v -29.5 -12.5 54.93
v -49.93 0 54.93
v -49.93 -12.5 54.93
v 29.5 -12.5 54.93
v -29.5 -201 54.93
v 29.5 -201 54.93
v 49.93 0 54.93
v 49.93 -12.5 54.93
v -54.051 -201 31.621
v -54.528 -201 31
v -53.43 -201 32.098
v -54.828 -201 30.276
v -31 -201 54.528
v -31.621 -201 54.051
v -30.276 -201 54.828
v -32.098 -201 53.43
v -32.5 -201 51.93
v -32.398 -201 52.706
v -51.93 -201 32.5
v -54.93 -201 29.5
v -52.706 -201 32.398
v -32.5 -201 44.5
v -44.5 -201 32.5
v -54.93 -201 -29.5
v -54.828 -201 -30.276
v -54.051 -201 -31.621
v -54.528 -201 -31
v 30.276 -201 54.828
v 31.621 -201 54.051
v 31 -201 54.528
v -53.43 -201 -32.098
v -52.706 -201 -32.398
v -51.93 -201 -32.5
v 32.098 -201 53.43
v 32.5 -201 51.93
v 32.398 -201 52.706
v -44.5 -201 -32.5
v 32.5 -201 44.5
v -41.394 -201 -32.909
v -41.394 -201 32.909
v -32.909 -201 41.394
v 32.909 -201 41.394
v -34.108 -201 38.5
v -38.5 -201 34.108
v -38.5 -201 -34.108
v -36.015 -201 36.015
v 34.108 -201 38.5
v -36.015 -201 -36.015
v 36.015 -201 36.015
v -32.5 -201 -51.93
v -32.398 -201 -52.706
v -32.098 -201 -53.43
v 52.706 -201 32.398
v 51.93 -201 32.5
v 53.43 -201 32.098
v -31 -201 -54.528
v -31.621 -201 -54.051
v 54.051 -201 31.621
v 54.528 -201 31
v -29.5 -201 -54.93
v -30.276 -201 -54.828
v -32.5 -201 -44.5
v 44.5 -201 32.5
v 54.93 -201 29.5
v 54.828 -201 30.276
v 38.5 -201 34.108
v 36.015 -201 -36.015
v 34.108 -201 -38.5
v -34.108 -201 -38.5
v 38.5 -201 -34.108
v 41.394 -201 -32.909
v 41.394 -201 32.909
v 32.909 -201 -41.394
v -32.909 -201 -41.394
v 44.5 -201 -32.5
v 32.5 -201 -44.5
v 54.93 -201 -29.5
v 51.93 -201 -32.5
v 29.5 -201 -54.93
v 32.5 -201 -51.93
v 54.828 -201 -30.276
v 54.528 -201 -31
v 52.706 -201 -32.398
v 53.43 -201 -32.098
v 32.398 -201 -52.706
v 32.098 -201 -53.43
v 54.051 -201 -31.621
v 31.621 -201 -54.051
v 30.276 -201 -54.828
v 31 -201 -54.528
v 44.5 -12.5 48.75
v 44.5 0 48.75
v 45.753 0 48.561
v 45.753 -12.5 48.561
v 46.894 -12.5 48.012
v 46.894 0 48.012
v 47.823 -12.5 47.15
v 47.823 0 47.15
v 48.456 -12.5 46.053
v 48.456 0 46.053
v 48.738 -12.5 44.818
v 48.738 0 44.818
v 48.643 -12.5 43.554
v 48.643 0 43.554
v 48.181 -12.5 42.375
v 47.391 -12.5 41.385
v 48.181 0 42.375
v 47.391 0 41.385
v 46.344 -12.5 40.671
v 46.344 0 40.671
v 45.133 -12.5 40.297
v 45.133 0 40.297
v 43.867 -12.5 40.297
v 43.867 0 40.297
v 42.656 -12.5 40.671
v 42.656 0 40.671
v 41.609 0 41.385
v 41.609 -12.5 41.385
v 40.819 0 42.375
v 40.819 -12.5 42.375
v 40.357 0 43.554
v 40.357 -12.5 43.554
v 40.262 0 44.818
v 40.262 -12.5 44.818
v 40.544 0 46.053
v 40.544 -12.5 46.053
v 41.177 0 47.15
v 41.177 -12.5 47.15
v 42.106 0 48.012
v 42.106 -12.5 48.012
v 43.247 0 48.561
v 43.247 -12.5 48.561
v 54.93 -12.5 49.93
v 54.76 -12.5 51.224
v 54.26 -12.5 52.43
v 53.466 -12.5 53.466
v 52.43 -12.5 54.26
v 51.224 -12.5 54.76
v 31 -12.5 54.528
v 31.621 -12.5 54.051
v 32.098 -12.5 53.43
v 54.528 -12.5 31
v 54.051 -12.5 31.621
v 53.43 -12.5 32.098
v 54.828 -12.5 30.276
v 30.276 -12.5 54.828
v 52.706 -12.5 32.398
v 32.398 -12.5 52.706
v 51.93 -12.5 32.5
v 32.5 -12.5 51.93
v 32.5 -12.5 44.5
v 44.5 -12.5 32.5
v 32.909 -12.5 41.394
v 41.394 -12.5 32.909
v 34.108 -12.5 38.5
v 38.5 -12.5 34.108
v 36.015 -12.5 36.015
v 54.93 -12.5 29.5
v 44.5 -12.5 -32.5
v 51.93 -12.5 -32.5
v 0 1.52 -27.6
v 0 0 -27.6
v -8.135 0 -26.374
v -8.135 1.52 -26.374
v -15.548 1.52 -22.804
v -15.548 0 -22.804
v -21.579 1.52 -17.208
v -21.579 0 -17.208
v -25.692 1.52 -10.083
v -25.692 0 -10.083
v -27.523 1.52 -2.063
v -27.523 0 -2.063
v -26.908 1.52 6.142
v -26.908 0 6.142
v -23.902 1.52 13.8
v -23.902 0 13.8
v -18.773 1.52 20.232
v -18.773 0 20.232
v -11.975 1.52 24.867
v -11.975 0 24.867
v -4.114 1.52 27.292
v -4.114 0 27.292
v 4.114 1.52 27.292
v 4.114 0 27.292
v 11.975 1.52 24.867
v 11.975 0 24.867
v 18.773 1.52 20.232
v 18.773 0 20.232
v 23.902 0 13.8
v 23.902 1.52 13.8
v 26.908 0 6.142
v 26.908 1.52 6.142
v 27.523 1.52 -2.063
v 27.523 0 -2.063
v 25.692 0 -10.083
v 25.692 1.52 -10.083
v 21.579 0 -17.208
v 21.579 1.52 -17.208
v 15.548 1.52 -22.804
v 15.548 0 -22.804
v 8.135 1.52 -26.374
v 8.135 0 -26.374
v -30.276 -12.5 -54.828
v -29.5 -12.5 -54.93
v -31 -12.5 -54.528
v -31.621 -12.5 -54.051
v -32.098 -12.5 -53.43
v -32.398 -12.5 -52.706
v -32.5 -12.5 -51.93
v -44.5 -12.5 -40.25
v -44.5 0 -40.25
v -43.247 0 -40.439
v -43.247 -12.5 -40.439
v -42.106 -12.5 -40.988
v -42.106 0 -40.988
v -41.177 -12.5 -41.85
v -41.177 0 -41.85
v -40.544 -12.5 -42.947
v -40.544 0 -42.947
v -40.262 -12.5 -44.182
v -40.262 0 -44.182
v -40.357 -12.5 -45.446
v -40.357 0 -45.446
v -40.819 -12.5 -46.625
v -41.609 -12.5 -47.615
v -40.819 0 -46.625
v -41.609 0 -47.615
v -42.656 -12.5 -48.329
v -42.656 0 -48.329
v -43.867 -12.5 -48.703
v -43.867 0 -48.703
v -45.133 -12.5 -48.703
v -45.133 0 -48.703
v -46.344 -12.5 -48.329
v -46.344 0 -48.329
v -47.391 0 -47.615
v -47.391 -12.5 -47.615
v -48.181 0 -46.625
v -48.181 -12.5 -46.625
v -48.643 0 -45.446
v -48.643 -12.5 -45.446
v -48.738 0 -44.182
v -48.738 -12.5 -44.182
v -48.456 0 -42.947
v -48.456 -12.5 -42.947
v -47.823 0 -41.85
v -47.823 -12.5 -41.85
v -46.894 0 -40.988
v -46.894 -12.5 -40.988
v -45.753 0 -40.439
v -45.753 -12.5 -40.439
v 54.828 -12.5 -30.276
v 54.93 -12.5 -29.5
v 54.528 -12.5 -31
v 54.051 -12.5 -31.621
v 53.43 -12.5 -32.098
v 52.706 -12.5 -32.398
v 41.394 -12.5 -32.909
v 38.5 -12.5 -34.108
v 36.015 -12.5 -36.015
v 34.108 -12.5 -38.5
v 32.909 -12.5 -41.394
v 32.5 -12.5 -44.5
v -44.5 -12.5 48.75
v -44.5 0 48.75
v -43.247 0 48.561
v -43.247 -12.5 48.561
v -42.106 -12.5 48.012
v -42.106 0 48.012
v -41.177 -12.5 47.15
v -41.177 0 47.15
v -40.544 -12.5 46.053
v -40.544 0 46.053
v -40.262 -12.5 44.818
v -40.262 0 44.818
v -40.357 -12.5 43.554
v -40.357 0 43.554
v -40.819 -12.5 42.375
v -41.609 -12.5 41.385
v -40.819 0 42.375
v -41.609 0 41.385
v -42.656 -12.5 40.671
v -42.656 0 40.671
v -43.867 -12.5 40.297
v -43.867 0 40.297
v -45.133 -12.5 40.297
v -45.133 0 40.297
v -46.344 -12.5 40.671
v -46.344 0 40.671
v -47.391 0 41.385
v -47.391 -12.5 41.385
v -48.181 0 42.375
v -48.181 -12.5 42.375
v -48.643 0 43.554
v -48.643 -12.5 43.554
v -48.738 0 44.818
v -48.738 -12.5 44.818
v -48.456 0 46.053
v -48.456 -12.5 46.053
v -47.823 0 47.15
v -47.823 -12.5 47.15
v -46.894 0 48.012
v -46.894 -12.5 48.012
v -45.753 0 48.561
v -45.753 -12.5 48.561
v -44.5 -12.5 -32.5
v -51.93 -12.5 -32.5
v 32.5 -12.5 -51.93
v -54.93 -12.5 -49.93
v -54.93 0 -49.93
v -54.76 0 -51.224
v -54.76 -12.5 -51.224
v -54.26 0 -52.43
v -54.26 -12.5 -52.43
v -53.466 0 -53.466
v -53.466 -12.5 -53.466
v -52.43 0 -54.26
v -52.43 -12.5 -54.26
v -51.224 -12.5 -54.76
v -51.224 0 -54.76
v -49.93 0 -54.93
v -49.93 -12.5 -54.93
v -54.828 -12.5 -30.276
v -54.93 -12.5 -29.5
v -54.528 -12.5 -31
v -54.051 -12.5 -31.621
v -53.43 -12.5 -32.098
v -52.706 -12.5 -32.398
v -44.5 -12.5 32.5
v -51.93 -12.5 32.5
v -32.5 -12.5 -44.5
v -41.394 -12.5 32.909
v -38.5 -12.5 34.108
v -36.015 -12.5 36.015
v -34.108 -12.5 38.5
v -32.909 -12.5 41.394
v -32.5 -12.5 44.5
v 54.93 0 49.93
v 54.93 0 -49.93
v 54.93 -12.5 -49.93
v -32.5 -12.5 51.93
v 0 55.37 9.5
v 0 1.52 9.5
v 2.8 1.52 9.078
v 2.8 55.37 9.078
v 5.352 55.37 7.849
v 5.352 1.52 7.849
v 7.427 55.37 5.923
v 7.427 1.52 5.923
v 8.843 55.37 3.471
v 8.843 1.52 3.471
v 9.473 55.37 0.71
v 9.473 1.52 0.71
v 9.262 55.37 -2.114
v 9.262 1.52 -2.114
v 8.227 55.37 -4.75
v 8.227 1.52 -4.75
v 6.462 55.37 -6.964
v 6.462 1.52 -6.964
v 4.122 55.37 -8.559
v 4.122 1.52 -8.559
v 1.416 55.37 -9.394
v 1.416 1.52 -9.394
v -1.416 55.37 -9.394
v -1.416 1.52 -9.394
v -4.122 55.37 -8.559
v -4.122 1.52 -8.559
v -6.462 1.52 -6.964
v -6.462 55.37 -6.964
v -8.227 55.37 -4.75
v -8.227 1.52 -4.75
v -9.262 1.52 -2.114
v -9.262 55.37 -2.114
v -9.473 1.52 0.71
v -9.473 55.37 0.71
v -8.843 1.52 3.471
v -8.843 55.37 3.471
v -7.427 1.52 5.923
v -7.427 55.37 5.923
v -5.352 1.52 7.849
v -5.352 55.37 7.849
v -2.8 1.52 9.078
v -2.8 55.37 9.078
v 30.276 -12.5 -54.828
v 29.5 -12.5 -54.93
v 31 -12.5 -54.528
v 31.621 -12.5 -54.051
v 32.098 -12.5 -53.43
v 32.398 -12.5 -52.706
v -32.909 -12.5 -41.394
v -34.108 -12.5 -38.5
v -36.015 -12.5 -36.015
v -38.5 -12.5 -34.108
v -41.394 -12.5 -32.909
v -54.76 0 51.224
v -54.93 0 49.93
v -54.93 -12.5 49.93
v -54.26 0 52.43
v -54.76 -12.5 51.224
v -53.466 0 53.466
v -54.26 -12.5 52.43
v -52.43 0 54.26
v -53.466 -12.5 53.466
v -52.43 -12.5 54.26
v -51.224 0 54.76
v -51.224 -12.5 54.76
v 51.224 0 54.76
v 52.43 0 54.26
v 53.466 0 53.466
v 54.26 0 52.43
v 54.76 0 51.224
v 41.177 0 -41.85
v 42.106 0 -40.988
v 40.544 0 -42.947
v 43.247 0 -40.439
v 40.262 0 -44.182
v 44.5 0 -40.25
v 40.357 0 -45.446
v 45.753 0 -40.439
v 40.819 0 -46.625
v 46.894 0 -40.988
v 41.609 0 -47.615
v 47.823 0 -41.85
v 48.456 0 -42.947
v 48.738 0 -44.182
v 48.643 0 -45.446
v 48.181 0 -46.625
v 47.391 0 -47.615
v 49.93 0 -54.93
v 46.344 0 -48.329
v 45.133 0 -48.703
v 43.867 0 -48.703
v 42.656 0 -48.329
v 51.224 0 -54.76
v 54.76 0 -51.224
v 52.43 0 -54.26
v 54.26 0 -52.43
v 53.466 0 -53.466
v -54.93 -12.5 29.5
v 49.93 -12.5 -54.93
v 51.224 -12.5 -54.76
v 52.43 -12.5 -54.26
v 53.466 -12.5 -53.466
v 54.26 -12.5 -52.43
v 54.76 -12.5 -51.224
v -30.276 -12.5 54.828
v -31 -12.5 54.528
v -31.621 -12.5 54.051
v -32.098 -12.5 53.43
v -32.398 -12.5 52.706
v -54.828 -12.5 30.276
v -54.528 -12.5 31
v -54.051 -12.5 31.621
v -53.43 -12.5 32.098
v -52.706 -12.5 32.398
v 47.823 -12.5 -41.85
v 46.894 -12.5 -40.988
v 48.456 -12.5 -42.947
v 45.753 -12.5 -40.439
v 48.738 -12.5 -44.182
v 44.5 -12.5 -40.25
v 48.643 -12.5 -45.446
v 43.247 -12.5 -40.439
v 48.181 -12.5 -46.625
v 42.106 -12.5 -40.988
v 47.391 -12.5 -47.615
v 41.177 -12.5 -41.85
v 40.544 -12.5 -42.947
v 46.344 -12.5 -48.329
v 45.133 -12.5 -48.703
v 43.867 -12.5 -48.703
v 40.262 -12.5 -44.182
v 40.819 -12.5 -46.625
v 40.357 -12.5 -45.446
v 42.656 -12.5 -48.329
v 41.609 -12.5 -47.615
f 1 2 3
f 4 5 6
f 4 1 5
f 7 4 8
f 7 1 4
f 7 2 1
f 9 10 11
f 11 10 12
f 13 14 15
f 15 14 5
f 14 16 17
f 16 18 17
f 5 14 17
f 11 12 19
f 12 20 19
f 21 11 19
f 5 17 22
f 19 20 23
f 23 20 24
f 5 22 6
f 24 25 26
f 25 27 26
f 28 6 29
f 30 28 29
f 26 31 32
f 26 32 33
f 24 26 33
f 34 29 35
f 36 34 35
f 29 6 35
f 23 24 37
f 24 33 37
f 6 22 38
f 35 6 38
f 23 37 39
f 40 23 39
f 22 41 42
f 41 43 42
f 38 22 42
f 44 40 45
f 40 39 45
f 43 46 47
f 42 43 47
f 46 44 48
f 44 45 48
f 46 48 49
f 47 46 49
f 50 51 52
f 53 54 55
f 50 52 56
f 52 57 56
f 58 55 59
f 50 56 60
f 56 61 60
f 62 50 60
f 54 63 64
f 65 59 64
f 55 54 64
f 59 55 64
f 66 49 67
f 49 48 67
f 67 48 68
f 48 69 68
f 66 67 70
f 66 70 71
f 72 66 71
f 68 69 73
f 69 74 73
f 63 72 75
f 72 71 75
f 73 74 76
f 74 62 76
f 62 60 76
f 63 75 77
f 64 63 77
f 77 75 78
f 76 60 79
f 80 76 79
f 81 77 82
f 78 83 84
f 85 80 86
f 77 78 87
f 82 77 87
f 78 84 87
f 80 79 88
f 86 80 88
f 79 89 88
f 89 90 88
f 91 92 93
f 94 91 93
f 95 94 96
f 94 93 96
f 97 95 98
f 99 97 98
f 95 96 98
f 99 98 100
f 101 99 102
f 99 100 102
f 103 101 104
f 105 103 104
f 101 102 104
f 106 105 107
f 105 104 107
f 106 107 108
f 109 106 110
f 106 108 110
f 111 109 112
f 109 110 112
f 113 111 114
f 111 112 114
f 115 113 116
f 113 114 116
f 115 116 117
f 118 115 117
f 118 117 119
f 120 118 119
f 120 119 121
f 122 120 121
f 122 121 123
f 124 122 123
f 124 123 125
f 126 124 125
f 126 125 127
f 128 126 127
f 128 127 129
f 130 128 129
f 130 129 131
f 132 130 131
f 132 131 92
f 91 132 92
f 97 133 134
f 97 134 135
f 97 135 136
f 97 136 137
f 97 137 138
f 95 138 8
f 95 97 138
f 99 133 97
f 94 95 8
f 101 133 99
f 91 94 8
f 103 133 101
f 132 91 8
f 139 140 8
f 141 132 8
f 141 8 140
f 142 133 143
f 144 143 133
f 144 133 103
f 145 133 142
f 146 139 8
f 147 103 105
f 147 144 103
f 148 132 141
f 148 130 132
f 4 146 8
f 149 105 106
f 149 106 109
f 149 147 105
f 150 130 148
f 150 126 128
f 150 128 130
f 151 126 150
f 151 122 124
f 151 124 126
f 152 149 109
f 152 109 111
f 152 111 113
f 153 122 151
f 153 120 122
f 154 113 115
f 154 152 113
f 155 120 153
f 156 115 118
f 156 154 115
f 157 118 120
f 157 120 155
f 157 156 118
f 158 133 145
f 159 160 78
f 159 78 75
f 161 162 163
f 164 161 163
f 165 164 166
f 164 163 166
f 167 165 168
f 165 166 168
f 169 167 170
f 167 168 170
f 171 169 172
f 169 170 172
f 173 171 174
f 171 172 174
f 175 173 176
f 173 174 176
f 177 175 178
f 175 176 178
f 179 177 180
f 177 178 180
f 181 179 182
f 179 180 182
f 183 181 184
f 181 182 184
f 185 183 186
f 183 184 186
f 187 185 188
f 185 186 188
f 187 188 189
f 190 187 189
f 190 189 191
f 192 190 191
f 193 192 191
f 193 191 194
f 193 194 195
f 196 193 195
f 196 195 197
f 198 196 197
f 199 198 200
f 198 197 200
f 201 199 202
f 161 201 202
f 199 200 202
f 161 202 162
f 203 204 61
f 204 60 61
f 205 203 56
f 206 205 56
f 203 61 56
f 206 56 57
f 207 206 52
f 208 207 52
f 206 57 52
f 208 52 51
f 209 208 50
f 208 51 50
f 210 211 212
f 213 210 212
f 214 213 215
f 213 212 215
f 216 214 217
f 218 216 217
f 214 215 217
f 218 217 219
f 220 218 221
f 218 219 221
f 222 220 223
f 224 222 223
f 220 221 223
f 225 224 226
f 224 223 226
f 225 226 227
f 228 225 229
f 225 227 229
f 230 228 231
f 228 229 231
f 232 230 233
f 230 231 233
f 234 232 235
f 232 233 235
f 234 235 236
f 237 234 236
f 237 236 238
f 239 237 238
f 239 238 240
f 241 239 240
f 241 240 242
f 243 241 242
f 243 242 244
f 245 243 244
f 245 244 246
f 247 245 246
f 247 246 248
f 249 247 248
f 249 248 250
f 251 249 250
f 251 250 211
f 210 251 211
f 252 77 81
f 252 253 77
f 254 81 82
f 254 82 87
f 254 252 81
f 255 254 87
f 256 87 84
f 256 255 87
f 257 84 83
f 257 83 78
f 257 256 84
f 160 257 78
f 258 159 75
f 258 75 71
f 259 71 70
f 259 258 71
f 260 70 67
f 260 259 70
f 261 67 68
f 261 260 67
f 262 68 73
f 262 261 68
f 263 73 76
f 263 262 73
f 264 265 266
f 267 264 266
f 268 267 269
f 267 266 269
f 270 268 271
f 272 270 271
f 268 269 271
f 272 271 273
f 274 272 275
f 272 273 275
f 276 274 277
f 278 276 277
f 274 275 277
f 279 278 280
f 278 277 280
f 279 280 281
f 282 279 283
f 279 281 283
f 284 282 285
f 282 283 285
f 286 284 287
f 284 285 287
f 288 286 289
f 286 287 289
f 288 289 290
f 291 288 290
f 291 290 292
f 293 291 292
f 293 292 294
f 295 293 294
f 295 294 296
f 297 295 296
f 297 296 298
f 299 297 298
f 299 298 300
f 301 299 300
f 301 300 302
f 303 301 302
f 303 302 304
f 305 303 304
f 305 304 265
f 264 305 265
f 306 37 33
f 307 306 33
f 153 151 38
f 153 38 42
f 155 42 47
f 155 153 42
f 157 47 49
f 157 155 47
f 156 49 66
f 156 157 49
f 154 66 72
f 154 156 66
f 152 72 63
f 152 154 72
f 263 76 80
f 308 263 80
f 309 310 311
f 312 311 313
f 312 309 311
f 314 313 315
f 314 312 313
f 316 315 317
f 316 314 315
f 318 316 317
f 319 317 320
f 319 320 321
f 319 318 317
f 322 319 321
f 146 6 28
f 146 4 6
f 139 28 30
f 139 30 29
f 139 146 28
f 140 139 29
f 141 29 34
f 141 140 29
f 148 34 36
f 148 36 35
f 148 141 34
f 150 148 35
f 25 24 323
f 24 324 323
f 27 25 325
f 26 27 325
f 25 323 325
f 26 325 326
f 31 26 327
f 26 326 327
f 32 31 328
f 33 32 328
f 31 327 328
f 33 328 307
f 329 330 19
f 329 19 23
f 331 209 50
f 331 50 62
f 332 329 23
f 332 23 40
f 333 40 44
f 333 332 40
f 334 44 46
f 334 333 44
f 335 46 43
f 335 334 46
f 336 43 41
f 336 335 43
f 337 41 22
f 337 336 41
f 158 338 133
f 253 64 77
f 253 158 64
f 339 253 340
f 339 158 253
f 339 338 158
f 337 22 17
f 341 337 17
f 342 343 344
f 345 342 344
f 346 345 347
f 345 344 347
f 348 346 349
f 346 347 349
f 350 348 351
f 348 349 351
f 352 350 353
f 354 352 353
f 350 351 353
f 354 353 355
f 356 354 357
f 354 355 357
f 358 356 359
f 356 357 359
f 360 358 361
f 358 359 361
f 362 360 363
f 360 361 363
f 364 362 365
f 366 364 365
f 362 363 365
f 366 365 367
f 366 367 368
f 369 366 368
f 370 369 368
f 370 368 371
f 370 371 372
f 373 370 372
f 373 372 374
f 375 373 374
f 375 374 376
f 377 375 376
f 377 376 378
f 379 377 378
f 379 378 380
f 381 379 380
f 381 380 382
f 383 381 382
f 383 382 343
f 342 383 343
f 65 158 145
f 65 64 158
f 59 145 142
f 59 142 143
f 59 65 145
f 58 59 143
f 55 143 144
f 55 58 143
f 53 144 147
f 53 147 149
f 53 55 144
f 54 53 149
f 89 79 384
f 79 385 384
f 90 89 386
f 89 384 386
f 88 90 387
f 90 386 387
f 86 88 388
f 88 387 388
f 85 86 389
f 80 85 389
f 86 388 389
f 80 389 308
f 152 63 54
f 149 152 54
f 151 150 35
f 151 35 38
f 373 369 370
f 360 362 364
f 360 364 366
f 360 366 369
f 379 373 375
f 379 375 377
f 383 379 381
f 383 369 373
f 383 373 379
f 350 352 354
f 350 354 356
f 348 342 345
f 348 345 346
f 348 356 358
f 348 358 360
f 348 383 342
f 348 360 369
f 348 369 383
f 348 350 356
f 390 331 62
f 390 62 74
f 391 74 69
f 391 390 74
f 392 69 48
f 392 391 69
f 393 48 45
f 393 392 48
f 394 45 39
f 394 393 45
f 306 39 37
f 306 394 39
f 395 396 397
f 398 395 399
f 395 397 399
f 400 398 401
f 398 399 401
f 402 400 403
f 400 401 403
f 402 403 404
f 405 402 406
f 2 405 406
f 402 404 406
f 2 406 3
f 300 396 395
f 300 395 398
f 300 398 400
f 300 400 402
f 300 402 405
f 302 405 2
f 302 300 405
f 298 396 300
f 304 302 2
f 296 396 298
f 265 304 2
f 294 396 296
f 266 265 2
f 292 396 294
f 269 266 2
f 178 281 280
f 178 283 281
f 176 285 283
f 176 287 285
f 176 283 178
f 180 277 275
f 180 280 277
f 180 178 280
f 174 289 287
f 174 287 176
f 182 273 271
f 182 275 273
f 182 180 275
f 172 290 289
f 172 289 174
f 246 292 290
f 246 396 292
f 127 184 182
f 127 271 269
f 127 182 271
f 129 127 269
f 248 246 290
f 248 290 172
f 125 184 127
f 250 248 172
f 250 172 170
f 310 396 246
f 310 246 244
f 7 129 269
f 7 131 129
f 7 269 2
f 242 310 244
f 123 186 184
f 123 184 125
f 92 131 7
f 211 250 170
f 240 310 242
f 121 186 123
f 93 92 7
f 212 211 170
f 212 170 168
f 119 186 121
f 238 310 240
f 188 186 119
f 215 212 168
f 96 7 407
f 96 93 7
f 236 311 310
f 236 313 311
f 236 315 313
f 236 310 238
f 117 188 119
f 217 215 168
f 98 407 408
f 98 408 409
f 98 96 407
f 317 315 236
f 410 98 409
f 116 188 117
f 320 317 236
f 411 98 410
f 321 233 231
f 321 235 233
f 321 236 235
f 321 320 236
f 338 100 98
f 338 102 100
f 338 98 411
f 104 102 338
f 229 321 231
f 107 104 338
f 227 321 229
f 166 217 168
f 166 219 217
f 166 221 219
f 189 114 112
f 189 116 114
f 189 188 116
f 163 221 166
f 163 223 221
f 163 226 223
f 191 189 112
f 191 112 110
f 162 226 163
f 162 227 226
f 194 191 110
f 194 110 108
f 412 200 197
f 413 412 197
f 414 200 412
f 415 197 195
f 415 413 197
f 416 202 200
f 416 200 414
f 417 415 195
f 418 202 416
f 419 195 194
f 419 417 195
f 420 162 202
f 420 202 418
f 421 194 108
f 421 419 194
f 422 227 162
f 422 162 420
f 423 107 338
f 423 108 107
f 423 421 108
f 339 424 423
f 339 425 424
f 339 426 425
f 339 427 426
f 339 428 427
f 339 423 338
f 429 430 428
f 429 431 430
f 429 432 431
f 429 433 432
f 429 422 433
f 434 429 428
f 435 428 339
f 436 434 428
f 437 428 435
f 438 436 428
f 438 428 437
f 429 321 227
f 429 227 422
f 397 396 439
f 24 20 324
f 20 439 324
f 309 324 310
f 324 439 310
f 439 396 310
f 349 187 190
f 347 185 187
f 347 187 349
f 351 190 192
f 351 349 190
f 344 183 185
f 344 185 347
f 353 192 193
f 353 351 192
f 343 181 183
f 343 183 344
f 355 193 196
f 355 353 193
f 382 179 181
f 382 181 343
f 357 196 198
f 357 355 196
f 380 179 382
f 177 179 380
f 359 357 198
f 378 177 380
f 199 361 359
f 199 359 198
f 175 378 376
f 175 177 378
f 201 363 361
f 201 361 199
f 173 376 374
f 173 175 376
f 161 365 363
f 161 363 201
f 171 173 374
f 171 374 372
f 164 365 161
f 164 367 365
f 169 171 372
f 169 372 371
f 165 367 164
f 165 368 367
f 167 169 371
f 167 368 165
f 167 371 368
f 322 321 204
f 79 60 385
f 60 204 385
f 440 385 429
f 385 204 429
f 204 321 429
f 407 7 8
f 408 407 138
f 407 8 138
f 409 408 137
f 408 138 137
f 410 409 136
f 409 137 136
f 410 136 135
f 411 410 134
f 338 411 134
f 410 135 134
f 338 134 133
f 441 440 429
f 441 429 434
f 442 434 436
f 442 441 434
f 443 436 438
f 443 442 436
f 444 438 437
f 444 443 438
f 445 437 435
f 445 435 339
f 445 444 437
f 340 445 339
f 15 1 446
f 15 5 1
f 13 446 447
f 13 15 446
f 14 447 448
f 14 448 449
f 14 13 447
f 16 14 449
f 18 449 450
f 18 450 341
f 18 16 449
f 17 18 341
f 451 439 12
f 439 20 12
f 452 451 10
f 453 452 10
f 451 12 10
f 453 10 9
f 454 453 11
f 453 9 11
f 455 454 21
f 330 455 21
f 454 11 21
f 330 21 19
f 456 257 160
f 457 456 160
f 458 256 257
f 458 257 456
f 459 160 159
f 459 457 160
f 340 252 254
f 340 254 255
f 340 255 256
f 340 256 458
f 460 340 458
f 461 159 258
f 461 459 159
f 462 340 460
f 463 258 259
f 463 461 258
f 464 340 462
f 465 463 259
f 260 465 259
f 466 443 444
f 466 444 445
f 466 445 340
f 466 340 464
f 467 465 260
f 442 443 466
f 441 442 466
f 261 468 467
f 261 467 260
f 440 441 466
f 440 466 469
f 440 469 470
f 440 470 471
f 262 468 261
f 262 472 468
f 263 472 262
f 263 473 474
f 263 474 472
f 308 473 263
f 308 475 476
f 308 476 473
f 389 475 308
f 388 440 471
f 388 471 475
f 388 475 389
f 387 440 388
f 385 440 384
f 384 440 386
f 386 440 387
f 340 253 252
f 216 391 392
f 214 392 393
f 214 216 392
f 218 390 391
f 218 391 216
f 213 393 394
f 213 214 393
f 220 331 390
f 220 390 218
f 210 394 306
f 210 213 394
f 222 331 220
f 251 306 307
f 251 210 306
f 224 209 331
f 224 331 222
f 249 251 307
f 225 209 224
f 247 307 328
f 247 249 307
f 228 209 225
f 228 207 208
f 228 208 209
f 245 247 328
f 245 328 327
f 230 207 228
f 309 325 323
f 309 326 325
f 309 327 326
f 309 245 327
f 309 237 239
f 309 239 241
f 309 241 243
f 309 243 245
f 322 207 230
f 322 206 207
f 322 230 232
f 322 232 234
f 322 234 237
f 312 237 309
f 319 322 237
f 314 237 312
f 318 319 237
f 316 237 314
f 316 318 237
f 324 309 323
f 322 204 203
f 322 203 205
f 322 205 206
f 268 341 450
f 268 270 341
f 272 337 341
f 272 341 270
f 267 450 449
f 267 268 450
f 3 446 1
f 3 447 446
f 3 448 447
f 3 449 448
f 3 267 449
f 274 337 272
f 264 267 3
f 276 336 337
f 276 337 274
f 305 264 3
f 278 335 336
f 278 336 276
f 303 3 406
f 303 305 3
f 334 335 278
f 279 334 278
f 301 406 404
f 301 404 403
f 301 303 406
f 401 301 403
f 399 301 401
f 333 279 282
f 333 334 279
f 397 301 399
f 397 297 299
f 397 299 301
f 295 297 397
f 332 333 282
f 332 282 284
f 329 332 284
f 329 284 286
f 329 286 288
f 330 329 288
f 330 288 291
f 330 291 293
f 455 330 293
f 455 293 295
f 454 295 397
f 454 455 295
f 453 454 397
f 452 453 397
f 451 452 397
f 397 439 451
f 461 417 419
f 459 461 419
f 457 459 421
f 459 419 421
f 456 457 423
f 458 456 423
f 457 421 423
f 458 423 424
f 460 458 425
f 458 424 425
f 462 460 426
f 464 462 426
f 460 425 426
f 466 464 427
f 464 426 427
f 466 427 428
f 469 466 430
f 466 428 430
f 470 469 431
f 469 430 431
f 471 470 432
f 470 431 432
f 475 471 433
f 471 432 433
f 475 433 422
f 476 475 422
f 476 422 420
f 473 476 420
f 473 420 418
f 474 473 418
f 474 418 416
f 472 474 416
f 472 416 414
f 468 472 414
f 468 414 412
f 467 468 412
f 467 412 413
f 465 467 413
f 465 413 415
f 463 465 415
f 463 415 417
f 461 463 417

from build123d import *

# Parameters (mm, degrees)
SKETCH1_W           = 109.86
SKETCH1_H           = 109.86
SKETCH1_R           = 4.25
BOSS_EXTRUDE1_DEPTH = 201
FILLET1_R           = 5
SKETCH2_R           = 27.6
BOSS_EXTRUDE2_DEPTH = 1.52
SKETCH3_R           = 9.5
BOSS_EXTRUDE3_DEPTH = 55.37
CUT_EXTRUDE1_START  = -12.5
CUT_EXTRUDE1_DEPTH  = 205.37
FILLET2_R           = 3


with BuildPart() as part:
    # Sketch1 → Boss-Extrude1 (new body)
    with BuildSketch(Plane(origin=(0, 0, 0), x_dir=(1, 0, 0), z_dir=(0, 1, 0))):
        Rectangle(SKETCH1_W, SKETCH1_H)
        with Locations(Location((-44.5, 44.5, 0), (0, 0, 270))):
            Circle(SKETCH1_R, mode=Mode.SUBTRACT)
        with Locations(Location((44.5, 44.5, 0), (0, 0, 270))):
            Circle(SKETCH1_R, mode=Mode.SUBTRACT)
        with Locations(Location((44.5, -44.5, 0), (0, 0, 270))):
            Circle(SKETCH1_R, mode=Mode.SUBTRACT)
        with Locations(Location((-44.5, -44.5, 0), (0, 0, 270))):
            Circle(SKETCH1_R, mode=Mode.SUBTRACT)
    extrude(amount=-BOSS_EXTRUDE1_DEPTH)

    # Fillet1
    fillet1_edges = [part.edges().sort_by_distance(p)[0] for p in [
        (54.93, -100.5, 54.93),
        (-54.93, -100.5, 54.93),
        (-54.93, -100.5, -54.93),
        (54.93, -100.5, -54.93),
    ]]
    fillet(fillet1_edges, radius=FILLET1_R)

    # Sketch2 → Boss-Extrude2 (add)
    with BuildSketch(Plane(origin=(0, 0, 0), x_dir=(1, 0, 0), z_dir=(0, 1, 0))):
        with Locations(Location((0, 0, 0), (0, 0, 90))):
            Circle(SKETCH2_R)
    extrude(amount=BOSS_EXTRUDE2_DEPTH)

    # Sketch3 → Boss-Extrude3 (add)
    with BuildSketch(Plane(origin=(0, 0, 0), x_dir=(1, 0, 0), z_dir=(0, 1, 0))):
        with Locations(Location((0, 0, 0), (0, 0, 270))):
            Circle(SKETCH3_R)
    extrude(amount=BOSS_EXTRUDE3_DEPTH)

    # Sketch5 → Cut-Extrude1 (cut)
    with BuildSketch(Plane(origin=(0, 0, 0), x_dir=(1, 0, 0), z_dir=(0, 1, 0)).offset(CUT_EXTRUDE1_START)):
        with BuildLine():
            Line((-44.5, 32.5), (-57.57926657, 32.5))
            Line((-57.57926657, 32.5), (-57.57926657, 62.356452686))
            Line((-57.57926657, 62.356452686), (-32.5, 61.861560204))
            Line((-32.5, 61.861560204), (-32.5, 44.5))
            ThreePointArc((-32.5, 44.5), (-36.014718626, 36.014718626), (-44.5, 32.5))
        make_face()
        with BuildLine():
            Line((62.356452686, 57.57926657), (61.861560204, 32.5))
            Line((61.861560204, 32.5), (44.5, 32.5))
            ThreePointArc((44.5, 32.5), (36.014718626, 36.014718626), (32.5, 44.5))
            Line((32.5, 44.5), (32.5, 57.57926657))
            Line((32.5, 57.57926657), (62.356452686, 57.57926657))
        make_face()
        with BuildLine():
            Line((57.57926657, -62.356452686), (32.5, -61.861560204))
            Line((32.5, -61.861560204), (32.5, -44.5))
            ThreePointArc((32.5, -44.5), (36.014718626, -36.014718626), (44.5, -32.5))
            Line((44.5, -32.5), (57.57926657, -32.5))
            Line((57.57926657, -32.5), (57.57926657, -62.356452686))
        make_face()
        with BuildLine():
            Line((-62.356452686, -57.57926657), (-61.861560204, -32.5))
            Line((-61.861560204, -32.5), (-44.5, -32.5))
            ThreePointArc((-44.5, -32.5), (-36.014718626, -36.014718626), (-32.5, -44.5))
            Line((-32.5, -44.5), (-32.5, -57.57926657))
            Line((-32.5, -57.57926657), (-62.356452686, -57.57926657))
        make_face()
    extrude(amount=-CUT_EXTRUDE1_DEPTH, mode=Mode.SUBTRACT)

    # Fillet2
    fillet2_edges = [part.edges().sort_by_distance(p)[0] for p in [
        (32.5, -106.75, 54.93),
        (32.5, -106.75, -54.93),
        (54.93, -106.75, -32.5),
        (-54.93, -106.75, -32.5),
        (-32.5, -106.75, -54.93),
        (-32.5, -106.75, 54.93),
        (-54.93, -106.75, 32.5),
        (54.93, -106.75, 32.5),
    ]]
    fillet(fillet2_edges, radius=FILLET2_R)


solid = part.part
